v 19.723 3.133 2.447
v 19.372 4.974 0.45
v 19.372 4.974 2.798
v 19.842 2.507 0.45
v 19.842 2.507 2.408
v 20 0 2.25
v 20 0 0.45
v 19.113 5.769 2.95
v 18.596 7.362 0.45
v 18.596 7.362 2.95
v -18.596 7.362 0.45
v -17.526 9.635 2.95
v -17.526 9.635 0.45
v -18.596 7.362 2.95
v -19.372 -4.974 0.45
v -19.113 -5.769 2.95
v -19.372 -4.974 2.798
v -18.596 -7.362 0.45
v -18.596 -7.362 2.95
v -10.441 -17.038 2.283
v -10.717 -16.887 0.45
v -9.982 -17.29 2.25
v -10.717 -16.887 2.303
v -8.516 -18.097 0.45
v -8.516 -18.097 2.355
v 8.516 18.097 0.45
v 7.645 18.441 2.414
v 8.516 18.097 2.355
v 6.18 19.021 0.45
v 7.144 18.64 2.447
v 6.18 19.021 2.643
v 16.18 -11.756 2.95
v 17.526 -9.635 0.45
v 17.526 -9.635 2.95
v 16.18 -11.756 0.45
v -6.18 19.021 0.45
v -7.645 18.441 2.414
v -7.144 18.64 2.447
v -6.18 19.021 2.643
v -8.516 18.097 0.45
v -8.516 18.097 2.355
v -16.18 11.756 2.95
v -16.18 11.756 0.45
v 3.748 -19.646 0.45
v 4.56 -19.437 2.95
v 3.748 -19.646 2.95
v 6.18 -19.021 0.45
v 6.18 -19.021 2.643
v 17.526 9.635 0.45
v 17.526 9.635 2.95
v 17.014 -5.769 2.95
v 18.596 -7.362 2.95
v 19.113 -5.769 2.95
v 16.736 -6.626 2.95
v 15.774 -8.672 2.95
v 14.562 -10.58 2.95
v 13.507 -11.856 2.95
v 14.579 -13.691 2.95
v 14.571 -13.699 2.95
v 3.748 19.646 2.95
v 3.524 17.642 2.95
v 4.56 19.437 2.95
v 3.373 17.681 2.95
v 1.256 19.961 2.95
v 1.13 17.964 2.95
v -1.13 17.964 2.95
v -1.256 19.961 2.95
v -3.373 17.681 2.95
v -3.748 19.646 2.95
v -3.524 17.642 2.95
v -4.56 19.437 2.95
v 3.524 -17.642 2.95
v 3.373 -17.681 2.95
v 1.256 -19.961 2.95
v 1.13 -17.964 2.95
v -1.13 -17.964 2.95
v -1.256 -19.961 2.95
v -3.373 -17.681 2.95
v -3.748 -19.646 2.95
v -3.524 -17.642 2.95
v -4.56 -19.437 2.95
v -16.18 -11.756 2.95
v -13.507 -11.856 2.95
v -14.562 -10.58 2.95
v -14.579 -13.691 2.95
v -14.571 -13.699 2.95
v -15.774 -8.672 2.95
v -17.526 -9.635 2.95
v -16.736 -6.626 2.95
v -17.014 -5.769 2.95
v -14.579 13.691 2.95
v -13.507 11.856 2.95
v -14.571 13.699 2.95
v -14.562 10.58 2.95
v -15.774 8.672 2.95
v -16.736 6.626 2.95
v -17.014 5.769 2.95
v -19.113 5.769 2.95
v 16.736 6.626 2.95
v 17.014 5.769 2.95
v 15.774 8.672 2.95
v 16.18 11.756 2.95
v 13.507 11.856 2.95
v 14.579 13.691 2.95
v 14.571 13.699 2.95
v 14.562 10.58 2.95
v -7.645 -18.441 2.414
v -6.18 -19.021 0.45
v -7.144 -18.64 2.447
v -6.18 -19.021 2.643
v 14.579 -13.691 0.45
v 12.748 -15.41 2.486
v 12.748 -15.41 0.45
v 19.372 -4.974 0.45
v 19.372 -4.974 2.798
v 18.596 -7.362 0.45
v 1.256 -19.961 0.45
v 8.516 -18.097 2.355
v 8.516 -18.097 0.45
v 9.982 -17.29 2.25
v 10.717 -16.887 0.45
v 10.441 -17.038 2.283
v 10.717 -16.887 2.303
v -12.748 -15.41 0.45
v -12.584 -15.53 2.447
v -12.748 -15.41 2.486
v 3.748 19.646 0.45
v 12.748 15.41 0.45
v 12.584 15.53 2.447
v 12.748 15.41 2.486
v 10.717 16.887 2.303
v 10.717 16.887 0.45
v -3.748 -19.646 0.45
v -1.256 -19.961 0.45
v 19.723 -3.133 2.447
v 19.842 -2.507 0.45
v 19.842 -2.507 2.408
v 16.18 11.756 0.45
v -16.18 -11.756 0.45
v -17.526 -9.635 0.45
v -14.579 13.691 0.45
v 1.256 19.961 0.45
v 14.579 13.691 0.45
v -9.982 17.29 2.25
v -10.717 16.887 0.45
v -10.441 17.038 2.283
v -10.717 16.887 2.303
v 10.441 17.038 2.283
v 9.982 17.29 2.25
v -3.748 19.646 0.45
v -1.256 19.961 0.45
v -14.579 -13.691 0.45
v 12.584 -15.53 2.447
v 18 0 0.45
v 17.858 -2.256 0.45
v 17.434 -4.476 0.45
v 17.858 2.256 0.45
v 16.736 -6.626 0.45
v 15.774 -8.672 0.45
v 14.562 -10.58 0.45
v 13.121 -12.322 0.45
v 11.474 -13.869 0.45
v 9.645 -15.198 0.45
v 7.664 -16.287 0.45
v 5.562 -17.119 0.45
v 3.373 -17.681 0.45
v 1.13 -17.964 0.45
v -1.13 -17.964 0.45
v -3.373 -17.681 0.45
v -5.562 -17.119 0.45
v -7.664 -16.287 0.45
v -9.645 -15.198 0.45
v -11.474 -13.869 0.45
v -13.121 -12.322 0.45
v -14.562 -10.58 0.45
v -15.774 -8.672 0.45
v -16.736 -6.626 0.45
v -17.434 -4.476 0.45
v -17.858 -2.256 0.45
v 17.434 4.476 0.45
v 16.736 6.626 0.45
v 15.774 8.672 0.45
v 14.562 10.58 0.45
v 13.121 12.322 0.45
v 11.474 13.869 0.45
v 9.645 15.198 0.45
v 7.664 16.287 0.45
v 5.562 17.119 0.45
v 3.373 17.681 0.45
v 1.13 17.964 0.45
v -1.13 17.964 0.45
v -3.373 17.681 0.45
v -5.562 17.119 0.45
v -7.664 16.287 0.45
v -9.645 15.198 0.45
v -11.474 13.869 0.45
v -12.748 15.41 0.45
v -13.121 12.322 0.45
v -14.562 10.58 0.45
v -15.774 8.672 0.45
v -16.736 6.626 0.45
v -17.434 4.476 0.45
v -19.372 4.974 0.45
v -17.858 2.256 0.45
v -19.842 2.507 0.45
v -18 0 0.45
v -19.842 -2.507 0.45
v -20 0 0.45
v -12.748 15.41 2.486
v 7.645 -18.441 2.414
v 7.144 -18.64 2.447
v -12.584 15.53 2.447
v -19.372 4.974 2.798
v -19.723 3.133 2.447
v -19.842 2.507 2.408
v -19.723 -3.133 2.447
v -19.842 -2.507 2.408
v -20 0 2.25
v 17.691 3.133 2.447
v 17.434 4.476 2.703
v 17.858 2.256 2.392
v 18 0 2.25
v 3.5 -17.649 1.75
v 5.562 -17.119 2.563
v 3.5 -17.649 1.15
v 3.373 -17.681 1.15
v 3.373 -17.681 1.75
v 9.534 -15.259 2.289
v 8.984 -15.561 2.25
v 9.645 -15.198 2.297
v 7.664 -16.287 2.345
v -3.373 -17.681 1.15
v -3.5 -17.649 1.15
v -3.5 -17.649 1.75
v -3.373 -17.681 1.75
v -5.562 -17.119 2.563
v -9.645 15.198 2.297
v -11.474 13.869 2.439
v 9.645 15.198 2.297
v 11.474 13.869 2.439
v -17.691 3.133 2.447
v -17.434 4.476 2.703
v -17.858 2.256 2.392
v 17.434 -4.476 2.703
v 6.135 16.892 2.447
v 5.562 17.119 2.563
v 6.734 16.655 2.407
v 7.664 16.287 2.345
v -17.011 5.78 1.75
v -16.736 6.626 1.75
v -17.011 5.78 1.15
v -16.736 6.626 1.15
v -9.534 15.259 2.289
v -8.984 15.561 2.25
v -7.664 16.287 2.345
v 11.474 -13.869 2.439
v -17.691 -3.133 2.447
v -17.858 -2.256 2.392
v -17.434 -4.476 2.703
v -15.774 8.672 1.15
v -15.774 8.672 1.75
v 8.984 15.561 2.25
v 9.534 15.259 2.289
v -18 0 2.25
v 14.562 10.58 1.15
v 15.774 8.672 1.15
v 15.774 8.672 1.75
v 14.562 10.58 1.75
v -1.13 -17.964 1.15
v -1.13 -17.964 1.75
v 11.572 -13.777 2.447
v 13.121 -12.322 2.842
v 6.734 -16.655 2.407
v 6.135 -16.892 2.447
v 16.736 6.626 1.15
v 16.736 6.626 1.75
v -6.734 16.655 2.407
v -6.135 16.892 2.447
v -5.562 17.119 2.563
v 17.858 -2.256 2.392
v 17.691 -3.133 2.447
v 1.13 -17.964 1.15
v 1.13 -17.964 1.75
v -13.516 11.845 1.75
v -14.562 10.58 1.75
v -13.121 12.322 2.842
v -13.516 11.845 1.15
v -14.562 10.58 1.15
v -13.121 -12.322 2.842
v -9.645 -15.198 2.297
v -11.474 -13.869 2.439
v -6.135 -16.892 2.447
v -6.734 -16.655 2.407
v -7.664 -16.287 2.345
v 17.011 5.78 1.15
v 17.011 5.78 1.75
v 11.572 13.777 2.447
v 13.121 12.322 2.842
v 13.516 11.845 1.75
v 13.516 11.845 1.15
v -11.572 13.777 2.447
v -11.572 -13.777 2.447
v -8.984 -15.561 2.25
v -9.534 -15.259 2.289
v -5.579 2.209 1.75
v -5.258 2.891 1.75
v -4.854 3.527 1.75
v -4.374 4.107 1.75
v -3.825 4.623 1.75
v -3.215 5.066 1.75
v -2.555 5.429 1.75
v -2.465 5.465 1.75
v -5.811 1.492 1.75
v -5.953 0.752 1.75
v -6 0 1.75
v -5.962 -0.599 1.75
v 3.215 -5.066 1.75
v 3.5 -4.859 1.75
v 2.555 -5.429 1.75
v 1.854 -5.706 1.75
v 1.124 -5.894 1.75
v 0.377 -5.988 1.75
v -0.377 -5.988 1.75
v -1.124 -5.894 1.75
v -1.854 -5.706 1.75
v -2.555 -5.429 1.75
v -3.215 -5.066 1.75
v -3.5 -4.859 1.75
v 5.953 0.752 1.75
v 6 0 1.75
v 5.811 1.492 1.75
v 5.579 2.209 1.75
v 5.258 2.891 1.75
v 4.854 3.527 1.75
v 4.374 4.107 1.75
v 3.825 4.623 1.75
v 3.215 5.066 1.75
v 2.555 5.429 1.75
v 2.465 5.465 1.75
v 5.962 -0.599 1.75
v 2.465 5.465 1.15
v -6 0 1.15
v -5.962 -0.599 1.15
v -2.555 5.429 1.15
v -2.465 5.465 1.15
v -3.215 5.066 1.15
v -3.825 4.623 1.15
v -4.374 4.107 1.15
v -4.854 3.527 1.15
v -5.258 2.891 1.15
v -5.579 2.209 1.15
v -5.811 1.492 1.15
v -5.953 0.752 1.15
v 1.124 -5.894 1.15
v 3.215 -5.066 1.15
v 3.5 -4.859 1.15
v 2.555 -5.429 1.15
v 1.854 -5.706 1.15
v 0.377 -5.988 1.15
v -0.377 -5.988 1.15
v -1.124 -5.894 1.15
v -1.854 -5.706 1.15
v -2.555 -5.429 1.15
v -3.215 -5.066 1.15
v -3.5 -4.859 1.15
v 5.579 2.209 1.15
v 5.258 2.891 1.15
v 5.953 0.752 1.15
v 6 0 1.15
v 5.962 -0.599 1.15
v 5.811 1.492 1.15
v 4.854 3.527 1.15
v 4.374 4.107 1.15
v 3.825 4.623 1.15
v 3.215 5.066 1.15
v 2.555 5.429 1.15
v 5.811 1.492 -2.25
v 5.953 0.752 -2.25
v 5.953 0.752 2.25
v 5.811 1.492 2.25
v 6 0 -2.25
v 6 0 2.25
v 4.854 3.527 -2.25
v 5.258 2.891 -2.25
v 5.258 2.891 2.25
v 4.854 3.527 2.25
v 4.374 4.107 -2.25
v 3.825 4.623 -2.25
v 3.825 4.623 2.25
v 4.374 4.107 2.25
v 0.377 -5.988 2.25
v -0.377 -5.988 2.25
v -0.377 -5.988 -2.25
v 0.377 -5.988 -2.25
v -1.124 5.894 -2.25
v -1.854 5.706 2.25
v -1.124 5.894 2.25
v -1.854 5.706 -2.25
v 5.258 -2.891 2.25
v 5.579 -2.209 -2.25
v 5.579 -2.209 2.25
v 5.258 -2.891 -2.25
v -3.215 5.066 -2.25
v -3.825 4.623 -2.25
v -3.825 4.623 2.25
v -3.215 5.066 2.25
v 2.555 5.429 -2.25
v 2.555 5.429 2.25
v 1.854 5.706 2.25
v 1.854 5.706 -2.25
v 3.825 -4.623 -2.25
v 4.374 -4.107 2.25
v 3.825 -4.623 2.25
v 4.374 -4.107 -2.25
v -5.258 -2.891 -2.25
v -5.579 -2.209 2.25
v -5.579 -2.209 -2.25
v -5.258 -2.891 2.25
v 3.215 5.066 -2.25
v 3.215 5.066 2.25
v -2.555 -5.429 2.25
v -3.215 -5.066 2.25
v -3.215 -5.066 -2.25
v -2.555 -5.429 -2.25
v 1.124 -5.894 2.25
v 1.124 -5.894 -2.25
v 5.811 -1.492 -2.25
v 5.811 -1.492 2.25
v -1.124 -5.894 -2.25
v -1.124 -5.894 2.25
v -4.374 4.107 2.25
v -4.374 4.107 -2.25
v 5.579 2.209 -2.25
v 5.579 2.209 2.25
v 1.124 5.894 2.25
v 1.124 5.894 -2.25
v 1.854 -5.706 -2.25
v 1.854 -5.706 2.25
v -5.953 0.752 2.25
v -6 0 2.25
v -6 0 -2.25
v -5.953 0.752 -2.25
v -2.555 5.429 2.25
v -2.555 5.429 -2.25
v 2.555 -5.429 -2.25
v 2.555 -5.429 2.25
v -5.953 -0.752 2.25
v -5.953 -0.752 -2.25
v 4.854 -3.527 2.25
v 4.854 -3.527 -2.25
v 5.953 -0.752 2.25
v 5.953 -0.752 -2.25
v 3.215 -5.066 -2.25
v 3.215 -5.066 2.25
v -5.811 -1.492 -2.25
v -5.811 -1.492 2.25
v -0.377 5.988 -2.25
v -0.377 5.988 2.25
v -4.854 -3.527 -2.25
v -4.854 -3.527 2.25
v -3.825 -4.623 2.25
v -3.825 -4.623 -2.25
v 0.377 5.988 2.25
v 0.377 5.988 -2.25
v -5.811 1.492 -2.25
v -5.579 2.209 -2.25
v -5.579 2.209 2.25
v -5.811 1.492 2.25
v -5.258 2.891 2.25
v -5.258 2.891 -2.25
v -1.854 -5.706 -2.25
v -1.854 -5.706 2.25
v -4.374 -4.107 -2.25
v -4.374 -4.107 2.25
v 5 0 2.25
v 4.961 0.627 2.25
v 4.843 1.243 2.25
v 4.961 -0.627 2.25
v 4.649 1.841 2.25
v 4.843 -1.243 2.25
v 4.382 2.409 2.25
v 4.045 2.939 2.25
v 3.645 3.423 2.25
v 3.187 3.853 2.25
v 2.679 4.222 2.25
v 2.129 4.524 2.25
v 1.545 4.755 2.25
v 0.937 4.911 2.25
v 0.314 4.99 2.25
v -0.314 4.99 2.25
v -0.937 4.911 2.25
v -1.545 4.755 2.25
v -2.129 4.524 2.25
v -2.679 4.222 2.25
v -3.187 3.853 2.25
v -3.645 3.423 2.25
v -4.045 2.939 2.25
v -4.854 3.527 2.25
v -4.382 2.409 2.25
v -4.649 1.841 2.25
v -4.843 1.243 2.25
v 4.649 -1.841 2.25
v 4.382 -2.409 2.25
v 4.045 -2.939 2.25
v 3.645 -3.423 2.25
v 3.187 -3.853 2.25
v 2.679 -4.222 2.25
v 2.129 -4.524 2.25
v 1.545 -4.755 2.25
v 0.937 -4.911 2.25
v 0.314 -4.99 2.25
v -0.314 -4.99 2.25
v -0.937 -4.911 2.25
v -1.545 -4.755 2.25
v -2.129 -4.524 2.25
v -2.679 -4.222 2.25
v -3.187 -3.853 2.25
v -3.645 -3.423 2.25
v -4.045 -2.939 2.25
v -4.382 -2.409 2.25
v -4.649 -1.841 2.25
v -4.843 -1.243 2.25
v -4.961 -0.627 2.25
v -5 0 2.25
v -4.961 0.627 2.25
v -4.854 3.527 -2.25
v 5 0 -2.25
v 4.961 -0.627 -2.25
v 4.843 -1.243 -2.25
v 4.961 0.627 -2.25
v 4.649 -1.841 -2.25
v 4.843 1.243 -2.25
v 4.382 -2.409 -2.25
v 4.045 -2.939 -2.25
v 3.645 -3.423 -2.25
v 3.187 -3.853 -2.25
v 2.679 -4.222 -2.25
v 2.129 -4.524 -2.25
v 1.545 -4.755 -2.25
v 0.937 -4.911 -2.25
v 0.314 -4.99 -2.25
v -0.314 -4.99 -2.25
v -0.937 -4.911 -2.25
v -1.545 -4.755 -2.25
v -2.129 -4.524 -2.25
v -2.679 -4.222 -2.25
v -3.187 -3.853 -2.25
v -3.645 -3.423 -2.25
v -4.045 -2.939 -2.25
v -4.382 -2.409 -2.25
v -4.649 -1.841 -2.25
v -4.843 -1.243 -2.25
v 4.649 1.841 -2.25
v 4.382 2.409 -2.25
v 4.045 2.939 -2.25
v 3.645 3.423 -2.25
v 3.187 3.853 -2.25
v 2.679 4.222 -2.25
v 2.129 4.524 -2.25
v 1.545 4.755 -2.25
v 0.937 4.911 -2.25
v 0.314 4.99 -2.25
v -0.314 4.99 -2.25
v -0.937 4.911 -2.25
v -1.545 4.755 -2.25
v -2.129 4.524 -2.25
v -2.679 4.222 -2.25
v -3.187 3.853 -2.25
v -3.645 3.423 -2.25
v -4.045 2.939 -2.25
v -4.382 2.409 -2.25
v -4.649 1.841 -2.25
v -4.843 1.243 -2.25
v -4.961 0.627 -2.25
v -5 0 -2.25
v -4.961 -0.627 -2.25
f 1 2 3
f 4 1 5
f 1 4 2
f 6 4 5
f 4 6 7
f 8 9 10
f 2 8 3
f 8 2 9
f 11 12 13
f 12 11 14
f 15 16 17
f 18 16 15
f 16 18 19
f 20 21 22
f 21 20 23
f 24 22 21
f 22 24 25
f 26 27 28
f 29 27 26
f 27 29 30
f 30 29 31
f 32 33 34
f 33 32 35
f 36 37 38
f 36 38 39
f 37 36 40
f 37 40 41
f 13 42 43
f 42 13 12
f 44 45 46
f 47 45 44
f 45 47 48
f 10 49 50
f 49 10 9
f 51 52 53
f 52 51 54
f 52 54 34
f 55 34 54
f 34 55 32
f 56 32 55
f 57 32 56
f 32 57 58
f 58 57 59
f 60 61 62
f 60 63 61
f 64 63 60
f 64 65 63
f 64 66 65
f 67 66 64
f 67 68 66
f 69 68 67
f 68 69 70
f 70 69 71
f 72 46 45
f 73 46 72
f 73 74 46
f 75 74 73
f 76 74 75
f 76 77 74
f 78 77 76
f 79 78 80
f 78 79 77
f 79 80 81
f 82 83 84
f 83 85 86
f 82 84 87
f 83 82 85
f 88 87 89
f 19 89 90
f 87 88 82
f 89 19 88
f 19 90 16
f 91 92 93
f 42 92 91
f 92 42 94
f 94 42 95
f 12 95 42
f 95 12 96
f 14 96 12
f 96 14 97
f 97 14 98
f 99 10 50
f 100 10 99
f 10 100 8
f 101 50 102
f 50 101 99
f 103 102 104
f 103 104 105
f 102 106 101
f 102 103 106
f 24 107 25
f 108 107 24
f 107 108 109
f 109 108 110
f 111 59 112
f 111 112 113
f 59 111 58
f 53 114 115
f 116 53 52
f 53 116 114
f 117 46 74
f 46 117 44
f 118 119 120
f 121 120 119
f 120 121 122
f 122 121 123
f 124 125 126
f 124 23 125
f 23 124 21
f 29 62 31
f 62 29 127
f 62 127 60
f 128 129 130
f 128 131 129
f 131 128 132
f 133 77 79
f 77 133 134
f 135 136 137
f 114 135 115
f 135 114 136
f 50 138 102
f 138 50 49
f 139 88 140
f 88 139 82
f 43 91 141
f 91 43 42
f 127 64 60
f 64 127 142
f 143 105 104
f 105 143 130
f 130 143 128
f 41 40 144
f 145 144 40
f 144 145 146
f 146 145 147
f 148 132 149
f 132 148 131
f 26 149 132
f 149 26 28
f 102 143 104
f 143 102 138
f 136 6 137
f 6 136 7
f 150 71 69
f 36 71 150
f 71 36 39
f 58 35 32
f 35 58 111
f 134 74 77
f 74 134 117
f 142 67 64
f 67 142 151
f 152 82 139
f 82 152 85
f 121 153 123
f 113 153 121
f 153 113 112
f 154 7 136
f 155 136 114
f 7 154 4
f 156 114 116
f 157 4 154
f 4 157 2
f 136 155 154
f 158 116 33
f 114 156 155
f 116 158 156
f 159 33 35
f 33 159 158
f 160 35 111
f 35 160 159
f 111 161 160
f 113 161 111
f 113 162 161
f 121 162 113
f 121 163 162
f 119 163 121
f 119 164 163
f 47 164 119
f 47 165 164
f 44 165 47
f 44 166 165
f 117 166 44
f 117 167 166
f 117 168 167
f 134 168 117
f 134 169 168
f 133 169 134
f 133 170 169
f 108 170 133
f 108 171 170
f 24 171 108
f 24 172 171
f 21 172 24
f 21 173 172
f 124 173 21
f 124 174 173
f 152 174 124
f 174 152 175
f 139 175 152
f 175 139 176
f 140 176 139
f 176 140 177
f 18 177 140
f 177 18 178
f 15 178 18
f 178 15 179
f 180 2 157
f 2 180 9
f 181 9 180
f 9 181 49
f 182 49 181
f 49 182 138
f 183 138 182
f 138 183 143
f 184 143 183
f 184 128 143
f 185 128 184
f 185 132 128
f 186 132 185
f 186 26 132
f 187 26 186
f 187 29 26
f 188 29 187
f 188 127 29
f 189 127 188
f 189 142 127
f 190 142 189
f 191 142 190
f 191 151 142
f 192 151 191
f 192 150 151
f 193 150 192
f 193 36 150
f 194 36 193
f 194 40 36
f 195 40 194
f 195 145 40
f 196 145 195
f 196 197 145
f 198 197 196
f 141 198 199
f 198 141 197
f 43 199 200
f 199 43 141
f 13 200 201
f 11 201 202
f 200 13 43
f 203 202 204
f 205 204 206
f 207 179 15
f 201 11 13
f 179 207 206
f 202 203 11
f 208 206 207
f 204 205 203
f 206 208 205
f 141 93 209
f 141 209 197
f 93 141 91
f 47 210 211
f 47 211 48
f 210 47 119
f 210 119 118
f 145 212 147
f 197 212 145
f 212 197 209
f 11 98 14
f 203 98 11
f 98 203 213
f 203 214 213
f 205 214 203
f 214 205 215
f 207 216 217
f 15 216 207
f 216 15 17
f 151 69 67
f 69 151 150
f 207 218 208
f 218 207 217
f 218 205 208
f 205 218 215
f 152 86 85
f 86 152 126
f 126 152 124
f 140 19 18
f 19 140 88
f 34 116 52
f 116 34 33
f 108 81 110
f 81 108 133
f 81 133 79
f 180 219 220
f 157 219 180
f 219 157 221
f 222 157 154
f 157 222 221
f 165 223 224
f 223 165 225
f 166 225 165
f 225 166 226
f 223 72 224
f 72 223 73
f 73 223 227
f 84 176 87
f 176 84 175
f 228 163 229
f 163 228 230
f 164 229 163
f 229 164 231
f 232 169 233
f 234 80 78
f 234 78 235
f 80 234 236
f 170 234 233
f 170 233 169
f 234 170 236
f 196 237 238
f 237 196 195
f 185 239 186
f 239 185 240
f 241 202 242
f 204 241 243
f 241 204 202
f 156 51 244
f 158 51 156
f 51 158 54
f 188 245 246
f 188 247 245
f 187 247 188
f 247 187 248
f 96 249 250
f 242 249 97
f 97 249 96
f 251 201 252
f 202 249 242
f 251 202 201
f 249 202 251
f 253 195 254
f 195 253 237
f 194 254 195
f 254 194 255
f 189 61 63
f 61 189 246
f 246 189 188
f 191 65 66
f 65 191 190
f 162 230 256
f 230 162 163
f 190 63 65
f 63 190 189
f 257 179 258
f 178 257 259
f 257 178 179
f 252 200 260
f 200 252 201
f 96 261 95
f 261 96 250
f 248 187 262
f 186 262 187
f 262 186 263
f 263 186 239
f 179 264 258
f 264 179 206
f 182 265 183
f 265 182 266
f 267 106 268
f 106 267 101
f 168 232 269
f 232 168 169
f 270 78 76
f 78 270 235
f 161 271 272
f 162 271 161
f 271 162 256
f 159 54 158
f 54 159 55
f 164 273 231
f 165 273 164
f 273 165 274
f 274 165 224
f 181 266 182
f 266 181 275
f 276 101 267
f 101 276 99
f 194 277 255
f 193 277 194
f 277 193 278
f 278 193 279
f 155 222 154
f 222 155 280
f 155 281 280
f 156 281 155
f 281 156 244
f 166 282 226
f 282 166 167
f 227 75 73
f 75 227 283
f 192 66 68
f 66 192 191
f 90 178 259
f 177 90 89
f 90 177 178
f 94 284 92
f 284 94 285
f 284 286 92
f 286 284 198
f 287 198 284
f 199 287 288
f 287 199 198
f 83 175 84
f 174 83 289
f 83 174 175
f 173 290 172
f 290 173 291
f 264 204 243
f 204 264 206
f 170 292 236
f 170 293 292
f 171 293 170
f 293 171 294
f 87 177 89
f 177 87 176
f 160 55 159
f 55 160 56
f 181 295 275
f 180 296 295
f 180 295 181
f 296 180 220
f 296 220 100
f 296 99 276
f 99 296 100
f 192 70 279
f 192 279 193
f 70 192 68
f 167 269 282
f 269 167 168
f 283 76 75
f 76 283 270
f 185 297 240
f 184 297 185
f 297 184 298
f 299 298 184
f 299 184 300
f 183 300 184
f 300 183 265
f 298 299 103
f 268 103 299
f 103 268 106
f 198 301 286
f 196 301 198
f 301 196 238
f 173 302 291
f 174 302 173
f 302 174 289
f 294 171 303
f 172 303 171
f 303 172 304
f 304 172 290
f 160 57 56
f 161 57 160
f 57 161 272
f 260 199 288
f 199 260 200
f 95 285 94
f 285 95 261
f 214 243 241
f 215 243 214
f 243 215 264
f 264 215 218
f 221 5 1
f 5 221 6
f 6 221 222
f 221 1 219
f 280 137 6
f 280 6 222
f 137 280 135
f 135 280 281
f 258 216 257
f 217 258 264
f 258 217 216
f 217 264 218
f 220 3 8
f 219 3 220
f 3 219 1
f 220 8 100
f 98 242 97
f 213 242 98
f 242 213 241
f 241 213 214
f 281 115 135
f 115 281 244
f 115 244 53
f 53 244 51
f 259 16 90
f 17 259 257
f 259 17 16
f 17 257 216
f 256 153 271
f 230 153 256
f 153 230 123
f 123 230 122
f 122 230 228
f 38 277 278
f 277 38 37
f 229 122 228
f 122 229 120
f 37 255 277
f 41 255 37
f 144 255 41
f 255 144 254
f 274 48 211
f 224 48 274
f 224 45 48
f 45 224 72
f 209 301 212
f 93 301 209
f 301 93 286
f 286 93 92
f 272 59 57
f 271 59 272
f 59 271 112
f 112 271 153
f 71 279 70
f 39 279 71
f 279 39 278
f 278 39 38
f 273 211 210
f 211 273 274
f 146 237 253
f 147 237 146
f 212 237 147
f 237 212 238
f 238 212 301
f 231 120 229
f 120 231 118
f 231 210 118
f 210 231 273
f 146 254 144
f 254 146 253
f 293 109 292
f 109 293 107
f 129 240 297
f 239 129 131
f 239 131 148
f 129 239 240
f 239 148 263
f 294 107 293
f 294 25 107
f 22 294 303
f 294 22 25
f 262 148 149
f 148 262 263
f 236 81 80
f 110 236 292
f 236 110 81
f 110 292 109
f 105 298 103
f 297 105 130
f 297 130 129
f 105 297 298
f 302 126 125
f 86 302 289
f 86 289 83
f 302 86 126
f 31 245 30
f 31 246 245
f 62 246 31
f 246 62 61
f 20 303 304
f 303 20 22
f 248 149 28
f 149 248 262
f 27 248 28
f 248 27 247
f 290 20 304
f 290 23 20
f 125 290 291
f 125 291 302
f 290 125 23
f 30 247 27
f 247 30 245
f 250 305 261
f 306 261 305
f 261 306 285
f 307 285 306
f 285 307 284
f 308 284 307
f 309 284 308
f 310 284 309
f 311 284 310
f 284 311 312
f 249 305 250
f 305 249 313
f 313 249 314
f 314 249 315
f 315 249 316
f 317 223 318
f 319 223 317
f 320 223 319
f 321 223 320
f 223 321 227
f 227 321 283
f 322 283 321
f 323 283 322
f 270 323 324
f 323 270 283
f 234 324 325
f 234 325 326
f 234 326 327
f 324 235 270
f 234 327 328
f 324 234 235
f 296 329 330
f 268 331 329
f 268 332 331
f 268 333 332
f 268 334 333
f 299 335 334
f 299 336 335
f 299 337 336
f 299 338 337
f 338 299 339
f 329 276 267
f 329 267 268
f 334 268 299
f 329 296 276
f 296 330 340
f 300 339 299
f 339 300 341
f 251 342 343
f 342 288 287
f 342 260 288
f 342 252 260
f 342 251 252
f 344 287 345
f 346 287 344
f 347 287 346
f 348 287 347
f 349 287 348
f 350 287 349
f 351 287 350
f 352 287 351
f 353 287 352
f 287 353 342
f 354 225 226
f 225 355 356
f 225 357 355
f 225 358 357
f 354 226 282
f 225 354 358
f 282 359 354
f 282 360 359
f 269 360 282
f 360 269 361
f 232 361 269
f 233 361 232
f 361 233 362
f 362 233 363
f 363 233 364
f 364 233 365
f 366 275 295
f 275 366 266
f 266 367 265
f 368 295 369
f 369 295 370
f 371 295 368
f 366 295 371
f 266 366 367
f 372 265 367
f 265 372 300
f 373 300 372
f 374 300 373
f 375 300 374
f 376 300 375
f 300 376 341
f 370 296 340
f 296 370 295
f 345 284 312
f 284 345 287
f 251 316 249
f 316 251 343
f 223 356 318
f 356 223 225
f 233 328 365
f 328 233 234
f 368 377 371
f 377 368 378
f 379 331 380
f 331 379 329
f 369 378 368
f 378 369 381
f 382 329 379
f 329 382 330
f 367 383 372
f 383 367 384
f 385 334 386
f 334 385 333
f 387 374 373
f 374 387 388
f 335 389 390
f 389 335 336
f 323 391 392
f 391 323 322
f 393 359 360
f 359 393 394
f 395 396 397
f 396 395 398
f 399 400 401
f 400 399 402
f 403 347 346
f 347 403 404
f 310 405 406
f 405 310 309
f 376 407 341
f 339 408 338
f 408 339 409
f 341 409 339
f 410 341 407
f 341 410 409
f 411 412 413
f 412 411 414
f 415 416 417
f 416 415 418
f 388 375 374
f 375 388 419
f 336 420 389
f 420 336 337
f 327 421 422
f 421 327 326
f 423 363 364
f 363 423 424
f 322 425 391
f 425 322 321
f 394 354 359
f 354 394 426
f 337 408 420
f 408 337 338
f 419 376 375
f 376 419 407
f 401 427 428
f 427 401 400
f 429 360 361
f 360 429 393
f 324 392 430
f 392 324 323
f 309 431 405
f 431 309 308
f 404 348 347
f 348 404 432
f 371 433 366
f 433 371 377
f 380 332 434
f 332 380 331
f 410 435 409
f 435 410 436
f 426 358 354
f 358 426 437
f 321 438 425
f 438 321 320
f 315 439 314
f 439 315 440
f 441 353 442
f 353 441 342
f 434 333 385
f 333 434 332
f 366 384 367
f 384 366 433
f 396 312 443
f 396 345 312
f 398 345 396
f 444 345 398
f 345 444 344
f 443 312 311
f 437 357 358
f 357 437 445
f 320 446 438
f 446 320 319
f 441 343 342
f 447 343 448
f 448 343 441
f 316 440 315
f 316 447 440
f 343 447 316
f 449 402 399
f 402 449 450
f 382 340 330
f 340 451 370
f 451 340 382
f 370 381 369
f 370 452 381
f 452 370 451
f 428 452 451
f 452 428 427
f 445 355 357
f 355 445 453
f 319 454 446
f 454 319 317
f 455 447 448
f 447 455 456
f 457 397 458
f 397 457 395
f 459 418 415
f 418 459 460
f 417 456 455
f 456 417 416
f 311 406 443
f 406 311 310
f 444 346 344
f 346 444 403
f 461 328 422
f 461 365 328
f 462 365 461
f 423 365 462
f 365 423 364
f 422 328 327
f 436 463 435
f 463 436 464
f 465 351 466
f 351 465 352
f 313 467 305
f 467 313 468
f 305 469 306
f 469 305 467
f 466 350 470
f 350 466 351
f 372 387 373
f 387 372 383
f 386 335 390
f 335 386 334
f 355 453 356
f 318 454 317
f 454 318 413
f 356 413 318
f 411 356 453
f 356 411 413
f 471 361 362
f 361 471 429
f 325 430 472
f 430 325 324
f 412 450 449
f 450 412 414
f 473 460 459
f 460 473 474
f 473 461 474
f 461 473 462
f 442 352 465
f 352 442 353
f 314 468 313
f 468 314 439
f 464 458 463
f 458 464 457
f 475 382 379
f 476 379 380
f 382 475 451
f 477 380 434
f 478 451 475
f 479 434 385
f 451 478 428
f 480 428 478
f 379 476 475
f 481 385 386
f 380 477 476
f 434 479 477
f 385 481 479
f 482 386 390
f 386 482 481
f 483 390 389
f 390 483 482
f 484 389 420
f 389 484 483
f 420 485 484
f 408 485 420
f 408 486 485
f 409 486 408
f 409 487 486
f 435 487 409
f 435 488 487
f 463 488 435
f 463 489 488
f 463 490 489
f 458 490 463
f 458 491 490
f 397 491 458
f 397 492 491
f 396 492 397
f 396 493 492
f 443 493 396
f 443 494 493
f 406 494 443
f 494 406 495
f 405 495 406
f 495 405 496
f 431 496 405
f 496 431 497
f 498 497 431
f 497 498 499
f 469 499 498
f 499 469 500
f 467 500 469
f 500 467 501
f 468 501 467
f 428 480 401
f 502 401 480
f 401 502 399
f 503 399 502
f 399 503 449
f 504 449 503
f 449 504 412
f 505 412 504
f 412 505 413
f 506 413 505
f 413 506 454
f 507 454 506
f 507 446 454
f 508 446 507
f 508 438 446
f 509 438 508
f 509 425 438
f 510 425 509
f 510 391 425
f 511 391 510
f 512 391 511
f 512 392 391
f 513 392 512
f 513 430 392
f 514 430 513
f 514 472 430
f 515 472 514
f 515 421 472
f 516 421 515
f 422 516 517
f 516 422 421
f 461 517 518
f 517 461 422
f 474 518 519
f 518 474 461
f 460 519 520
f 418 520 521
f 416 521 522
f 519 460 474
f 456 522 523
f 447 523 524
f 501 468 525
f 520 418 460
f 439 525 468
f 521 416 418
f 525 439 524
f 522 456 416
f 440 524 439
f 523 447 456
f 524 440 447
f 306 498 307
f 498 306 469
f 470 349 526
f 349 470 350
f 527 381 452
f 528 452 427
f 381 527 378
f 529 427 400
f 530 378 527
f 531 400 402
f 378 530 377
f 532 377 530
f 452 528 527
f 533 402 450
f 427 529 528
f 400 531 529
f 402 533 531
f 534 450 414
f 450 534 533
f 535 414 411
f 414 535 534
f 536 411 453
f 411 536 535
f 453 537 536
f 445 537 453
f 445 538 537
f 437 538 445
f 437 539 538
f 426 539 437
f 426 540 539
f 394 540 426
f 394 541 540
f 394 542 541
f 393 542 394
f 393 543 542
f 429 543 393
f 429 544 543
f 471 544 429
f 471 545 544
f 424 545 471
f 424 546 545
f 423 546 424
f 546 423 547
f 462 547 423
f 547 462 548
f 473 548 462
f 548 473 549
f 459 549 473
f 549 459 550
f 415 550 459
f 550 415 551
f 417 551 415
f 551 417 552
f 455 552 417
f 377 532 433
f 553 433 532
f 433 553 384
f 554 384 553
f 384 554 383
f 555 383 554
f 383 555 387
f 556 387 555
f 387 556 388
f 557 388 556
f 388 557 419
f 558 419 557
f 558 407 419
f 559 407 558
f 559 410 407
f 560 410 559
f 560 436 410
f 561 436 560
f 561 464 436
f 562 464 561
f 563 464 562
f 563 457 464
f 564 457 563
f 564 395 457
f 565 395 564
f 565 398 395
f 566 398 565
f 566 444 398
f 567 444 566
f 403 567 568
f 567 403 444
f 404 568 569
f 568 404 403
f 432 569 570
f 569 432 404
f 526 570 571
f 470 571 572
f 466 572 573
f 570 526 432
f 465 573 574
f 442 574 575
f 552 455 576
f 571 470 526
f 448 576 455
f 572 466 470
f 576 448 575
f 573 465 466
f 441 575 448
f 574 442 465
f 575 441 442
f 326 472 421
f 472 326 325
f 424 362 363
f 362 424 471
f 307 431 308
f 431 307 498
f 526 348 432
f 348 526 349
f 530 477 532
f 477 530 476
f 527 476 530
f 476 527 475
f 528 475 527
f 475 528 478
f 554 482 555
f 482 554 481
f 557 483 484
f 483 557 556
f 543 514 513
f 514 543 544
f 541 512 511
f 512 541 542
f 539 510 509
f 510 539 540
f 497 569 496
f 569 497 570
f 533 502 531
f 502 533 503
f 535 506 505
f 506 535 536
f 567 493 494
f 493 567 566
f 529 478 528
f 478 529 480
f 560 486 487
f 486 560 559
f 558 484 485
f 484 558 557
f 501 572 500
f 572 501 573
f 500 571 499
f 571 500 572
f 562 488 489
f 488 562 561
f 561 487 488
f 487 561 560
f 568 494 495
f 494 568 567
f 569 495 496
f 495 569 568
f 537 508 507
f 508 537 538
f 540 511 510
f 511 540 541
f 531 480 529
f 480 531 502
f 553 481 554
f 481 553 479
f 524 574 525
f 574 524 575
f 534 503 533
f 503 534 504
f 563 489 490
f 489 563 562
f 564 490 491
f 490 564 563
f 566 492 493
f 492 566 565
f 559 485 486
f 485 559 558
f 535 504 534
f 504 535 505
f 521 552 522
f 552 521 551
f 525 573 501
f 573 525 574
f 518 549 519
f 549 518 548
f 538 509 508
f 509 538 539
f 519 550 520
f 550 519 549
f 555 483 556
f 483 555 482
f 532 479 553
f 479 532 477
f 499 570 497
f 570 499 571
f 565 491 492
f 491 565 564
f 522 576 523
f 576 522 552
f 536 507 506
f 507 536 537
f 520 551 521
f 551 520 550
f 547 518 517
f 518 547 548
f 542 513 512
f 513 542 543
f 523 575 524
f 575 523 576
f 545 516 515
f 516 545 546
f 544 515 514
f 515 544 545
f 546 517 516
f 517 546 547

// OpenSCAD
// file: ClickRingBase.scad
$fn=50;
overlap=0.006;

clickringHeight=4.5;
clickringDiameter=40;
clickringThickness=2;

notchDiameter=50;
notchHeight=0.7;

deltaRinsize=2;

module ring(height=clickringHeight,delta=0){
    difference()
    {
        cylinder(h=height+delta-deltaRinsize,d=clickringDiameter+delta,center=true);
        cylinder(h=height+1-delta-deltaRinsize,d=clickringDiameter-clickringThickness*2-delta,center=true);
    }
}
// file: Dimensions.scad
overlap=0.006;
$fn=50;

basePlateThickness=1;

ringOuterDiameter=60;
ringInnerDiameter=47;
ringHeight=10;
baseRingHeight=7;
capRingHeight=baseRingHeight;

axeDiameter=10;

screwHoleInnerDiameter=2.5;
screwHoleOuterDiameter=3.0;
screwHoleLength=14;
screwHoleStrengthener=0.5;

shaftLength=ringHeight*6+baseRingHeight+capRingHeight-screwHoleStrengthener-basePlateThickness*2;
shaftDiameter=9.5;
// main file
include <Dimensions.scad>
include <ClickRingBase.scad>


clickRing1();

module clickRing1(){
    ringWithNotch(0);

    difference()
    {
        union(){
            cylinder(h=clickringHeight,d=axeDiameter+2,center=true);

            for(i=[30:120:389]){
                rotate([0,0,i])
                translate([clickringDiameter/4-clickringThickness/2,0,clickringHeight/2-0.6/2-0.5])
                cube([clickringDiameter/2,7.0,0.6],center=true);
            }
        }
        cylinder(h=clickringHeight+overlap,d=axeDiameter,center=true);
    }
}

module ringWithNotch(delta=0){
    translate([0,0,deltaRinsize/2+notchHeight])
    difference()
    {
        ring(clickringHeight,delta);

        translate([0,0,notchDiameter/2+clickringHeight/2-deltaRinsize/2-notchHeight])
        for(a=[0:60:179]){
            rotate([a,90,0])
            cylinder(h=60,d=notchDiameter,center=true);
        }
    }
}
